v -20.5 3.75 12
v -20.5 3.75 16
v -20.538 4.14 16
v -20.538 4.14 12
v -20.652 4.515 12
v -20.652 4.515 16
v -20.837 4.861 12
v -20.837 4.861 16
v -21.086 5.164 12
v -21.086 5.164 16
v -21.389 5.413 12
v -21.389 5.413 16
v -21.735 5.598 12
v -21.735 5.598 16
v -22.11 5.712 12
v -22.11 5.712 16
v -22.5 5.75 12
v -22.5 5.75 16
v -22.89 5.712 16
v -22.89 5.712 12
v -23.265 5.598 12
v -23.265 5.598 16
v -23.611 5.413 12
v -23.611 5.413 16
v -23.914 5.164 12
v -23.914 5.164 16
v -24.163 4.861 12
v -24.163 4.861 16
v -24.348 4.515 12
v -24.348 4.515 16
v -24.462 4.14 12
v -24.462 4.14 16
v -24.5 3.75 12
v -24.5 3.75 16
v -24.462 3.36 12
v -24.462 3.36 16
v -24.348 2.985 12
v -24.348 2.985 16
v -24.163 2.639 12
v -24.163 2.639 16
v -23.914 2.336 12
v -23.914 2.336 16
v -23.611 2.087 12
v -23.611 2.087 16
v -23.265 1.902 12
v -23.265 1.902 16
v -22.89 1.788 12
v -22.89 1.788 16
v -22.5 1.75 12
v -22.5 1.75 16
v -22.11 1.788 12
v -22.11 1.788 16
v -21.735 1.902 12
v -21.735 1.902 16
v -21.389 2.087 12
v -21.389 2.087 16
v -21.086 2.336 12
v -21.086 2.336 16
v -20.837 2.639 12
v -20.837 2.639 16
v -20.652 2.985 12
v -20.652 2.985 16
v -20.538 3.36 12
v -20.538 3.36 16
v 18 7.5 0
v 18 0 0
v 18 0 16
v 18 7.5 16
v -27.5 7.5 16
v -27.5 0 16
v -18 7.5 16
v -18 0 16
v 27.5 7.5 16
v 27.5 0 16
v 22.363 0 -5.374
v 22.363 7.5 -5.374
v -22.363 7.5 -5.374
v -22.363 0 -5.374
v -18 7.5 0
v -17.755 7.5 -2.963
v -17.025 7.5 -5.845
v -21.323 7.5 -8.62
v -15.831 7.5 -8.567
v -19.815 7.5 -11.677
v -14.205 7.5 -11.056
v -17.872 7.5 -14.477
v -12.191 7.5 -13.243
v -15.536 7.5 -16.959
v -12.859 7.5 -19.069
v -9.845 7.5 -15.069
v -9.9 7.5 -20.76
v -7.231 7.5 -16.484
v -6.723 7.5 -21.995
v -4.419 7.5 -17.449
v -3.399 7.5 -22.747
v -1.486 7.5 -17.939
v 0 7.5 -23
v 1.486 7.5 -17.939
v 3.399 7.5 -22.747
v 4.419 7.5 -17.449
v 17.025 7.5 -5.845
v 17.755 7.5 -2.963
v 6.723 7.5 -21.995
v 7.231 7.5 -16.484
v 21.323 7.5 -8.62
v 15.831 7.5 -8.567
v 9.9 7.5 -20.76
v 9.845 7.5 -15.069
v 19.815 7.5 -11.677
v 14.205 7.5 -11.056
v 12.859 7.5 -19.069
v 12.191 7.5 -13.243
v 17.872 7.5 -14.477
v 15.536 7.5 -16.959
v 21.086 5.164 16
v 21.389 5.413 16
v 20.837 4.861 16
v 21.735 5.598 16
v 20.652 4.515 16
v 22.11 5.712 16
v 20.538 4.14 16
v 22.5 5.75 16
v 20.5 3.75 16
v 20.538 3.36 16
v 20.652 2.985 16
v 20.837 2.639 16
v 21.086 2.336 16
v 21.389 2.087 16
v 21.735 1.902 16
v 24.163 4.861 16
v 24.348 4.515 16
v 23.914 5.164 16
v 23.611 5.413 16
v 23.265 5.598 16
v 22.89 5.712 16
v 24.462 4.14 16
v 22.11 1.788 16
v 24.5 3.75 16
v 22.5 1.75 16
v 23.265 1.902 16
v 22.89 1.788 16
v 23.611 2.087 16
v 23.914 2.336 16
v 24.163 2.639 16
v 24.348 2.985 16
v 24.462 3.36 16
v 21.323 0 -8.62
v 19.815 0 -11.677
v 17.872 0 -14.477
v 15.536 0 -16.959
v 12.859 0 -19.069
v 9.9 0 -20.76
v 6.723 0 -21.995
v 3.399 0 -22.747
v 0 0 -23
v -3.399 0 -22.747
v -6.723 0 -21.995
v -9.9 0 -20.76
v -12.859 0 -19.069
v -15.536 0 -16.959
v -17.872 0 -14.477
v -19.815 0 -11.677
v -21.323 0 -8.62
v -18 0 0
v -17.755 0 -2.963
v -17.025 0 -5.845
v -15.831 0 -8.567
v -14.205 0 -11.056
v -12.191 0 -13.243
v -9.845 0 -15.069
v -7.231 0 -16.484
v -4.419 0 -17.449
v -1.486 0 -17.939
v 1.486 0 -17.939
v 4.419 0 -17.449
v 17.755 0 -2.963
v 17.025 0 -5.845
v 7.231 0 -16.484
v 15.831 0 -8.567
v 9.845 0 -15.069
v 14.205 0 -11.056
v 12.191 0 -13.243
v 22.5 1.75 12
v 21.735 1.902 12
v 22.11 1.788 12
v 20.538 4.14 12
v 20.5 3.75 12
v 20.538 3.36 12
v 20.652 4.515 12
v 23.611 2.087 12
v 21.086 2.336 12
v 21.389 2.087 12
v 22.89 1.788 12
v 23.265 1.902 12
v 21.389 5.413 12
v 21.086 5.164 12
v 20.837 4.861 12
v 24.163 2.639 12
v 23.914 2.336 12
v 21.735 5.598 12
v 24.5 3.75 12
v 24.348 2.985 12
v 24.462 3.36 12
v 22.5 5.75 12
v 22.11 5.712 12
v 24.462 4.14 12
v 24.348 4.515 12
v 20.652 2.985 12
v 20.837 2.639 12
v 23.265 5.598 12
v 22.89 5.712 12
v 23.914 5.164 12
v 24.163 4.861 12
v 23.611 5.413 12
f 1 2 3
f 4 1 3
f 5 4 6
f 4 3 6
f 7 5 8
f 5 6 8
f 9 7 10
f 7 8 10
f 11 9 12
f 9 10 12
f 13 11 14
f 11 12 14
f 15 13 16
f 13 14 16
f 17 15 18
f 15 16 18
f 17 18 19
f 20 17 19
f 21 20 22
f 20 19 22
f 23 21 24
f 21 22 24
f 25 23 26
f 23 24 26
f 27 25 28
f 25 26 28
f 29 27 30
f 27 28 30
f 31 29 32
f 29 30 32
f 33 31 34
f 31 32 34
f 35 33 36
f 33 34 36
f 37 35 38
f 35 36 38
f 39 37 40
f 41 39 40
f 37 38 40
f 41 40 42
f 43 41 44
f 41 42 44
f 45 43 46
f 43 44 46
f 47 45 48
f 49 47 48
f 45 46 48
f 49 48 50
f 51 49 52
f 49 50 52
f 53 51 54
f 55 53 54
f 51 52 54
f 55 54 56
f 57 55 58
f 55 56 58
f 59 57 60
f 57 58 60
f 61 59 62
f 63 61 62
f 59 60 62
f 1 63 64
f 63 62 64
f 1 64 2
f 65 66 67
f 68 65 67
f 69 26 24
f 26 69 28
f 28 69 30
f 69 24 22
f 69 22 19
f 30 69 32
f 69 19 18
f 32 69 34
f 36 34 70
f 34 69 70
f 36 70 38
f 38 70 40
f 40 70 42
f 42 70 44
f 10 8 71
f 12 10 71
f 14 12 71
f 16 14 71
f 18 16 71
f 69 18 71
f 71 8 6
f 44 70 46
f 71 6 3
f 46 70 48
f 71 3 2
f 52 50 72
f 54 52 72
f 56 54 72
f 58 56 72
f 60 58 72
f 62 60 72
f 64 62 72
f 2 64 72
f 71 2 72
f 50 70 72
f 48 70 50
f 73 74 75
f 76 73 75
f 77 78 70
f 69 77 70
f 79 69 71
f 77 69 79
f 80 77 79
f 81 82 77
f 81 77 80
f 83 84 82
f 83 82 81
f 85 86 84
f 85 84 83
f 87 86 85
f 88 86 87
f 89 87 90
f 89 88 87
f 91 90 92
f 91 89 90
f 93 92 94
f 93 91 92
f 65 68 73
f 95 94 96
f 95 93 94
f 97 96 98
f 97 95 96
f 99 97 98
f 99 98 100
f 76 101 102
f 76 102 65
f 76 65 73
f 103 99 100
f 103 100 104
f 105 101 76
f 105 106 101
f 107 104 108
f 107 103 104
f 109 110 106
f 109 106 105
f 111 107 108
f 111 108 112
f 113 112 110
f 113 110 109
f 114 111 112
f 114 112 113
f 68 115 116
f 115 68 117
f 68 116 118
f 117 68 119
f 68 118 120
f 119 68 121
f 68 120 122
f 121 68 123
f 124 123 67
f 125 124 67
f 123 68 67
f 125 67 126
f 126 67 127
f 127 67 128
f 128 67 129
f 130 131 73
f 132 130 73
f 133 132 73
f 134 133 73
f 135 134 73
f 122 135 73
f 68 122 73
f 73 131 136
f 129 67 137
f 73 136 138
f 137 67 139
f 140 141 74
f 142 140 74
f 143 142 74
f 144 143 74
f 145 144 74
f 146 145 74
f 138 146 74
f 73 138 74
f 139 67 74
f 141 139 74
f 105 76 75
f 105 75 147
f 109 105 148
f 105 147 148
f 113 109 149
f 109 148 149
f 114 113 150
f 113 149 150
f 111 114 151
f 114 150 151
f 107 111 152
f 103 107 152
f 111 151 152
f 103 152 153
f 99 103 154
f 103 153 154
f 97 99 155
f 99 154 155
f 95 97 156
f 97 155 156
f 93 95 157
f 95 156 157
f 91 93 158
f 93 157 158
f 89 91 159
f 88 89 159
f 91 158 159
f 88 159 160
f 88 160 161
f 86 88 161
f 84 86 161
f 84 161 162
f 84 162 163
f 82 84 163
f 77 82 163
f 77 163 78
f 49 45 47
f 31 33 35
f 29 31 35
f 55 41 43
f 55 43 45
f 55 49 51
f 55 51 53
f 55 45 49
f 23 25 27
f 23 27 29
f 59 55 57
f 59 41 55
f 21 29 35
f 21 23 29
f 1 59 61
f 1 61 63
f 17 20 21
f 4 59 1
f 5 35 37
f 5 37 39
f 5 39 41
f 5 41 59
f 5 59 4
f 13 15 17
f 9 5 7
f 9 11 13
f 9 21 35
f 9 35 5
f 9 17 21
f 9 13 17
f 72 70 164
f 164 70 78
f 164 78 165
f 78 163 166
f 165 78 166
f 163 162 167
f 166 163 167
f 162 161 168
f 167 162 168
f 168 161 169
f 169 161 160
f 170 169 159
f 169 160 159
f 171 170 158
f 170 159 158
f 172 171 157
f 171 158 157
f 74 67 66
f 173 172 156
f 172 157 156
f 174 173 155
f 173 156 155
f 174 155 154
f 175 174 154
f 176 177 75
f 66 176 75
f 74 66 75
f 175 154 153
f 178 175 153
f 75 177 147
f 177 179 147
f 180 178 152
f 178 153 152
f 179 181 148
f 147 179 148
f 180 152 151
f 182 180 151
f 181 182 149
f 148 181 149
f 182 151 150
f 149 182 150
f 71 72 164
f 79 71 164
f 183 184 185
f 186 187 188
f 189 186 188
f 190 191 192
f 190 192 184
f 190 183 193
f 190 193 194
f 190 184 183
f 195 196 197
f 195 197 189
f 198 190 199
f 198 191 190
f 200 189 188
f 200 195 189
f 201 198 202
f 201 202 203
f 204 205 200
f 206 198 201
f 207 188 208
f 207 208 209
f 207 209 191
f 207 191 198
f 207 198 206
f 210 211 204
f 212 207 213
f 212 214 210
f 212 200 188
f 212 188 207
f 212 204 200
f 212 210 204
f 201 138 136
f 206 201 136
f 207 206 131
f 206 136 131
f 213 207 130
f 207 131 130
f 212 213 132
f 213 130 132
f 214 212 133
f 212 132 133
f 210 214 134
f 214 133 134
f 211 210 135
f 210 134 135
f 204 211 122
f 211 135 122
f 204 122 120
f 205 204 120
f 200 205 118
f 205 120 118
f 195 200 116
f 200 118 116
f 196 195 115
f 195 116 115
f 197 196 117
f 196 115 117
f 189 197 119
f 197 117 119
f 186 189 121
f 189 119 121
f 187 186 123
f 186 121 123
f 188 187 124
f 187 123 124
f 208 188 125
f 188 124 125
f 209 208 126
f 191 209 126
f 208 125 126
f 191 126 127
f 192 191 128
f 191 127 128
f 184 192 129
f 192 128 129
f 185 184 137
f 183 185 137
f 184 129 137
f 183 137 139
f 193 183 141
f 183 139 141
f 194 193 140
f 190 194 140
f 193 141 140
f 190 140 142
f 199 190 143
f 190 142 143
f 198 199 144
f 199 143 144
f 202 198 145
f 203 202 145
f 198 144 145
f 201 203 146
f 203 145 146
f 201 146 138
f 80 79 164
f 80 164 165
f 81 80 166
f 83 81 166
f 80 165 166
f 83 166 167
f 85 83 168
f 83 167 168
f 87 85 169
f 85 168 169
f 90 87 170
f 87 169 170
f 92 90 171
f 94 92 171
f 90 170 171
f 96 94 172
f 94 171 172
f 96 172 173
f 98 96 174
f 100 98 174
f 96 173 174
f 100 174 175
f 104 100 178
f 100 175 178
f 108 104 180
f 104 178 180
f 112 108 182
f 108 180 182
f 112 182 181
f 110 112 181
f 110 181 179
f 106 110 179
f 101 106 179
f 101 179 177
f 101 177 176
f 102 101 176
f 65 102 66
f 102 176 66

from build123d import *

# Parameters (mm, degrees)
BOSS_EXTRUDE1_DEPTH = 7.5
SKETCH2_R           = 2
CUT_EXTRUDE1_DEPTH  = 4


with BuildPart() as part:
    # Sketch1 → Boss-Extrude1 (new body)
    with BuildSketch(Plane(origin=(0, 0, 0), x_dir=(1, 0, 0), z_dir=(0, 1, 0))):
        with BuildLine():
            Line((-22.363274725, 5.374378434), (-27.5, -16))
            Line((-27.5, -16), (-18, -16))
            Line((-18, -16), (-18, 0))
            ThreePointArc((-18, 0), (0, 18), (18, 0))
            Line((18, 0), (18, -16))
            Line((18, -16), (27.5, -16))
            Line((27.5, -16), (22.363274725, 5.374378434))
            ThreePointArc((22.363274725, 5.374378434), (0, 23), (-22.363274725, 5.374378434))
        make_face()
    extrude(amount=BOSS_EXTRUDE1_DEPTH)

    # Sketch2 → Cut-Extrude1 (cut)
    with BuildSketch(Plane.XY.offset(16)):
        with Locations((-22.5, 3.75)):
            Circle(SKETCH2_R)
        with Locations((22.5, 3.75)):
            Circle(SKETCH2_R)
    extrude(amount=-CUT_EXTRUDE1_DEPTH, mode=Mode.SUBTRACT)


solid = part.part
